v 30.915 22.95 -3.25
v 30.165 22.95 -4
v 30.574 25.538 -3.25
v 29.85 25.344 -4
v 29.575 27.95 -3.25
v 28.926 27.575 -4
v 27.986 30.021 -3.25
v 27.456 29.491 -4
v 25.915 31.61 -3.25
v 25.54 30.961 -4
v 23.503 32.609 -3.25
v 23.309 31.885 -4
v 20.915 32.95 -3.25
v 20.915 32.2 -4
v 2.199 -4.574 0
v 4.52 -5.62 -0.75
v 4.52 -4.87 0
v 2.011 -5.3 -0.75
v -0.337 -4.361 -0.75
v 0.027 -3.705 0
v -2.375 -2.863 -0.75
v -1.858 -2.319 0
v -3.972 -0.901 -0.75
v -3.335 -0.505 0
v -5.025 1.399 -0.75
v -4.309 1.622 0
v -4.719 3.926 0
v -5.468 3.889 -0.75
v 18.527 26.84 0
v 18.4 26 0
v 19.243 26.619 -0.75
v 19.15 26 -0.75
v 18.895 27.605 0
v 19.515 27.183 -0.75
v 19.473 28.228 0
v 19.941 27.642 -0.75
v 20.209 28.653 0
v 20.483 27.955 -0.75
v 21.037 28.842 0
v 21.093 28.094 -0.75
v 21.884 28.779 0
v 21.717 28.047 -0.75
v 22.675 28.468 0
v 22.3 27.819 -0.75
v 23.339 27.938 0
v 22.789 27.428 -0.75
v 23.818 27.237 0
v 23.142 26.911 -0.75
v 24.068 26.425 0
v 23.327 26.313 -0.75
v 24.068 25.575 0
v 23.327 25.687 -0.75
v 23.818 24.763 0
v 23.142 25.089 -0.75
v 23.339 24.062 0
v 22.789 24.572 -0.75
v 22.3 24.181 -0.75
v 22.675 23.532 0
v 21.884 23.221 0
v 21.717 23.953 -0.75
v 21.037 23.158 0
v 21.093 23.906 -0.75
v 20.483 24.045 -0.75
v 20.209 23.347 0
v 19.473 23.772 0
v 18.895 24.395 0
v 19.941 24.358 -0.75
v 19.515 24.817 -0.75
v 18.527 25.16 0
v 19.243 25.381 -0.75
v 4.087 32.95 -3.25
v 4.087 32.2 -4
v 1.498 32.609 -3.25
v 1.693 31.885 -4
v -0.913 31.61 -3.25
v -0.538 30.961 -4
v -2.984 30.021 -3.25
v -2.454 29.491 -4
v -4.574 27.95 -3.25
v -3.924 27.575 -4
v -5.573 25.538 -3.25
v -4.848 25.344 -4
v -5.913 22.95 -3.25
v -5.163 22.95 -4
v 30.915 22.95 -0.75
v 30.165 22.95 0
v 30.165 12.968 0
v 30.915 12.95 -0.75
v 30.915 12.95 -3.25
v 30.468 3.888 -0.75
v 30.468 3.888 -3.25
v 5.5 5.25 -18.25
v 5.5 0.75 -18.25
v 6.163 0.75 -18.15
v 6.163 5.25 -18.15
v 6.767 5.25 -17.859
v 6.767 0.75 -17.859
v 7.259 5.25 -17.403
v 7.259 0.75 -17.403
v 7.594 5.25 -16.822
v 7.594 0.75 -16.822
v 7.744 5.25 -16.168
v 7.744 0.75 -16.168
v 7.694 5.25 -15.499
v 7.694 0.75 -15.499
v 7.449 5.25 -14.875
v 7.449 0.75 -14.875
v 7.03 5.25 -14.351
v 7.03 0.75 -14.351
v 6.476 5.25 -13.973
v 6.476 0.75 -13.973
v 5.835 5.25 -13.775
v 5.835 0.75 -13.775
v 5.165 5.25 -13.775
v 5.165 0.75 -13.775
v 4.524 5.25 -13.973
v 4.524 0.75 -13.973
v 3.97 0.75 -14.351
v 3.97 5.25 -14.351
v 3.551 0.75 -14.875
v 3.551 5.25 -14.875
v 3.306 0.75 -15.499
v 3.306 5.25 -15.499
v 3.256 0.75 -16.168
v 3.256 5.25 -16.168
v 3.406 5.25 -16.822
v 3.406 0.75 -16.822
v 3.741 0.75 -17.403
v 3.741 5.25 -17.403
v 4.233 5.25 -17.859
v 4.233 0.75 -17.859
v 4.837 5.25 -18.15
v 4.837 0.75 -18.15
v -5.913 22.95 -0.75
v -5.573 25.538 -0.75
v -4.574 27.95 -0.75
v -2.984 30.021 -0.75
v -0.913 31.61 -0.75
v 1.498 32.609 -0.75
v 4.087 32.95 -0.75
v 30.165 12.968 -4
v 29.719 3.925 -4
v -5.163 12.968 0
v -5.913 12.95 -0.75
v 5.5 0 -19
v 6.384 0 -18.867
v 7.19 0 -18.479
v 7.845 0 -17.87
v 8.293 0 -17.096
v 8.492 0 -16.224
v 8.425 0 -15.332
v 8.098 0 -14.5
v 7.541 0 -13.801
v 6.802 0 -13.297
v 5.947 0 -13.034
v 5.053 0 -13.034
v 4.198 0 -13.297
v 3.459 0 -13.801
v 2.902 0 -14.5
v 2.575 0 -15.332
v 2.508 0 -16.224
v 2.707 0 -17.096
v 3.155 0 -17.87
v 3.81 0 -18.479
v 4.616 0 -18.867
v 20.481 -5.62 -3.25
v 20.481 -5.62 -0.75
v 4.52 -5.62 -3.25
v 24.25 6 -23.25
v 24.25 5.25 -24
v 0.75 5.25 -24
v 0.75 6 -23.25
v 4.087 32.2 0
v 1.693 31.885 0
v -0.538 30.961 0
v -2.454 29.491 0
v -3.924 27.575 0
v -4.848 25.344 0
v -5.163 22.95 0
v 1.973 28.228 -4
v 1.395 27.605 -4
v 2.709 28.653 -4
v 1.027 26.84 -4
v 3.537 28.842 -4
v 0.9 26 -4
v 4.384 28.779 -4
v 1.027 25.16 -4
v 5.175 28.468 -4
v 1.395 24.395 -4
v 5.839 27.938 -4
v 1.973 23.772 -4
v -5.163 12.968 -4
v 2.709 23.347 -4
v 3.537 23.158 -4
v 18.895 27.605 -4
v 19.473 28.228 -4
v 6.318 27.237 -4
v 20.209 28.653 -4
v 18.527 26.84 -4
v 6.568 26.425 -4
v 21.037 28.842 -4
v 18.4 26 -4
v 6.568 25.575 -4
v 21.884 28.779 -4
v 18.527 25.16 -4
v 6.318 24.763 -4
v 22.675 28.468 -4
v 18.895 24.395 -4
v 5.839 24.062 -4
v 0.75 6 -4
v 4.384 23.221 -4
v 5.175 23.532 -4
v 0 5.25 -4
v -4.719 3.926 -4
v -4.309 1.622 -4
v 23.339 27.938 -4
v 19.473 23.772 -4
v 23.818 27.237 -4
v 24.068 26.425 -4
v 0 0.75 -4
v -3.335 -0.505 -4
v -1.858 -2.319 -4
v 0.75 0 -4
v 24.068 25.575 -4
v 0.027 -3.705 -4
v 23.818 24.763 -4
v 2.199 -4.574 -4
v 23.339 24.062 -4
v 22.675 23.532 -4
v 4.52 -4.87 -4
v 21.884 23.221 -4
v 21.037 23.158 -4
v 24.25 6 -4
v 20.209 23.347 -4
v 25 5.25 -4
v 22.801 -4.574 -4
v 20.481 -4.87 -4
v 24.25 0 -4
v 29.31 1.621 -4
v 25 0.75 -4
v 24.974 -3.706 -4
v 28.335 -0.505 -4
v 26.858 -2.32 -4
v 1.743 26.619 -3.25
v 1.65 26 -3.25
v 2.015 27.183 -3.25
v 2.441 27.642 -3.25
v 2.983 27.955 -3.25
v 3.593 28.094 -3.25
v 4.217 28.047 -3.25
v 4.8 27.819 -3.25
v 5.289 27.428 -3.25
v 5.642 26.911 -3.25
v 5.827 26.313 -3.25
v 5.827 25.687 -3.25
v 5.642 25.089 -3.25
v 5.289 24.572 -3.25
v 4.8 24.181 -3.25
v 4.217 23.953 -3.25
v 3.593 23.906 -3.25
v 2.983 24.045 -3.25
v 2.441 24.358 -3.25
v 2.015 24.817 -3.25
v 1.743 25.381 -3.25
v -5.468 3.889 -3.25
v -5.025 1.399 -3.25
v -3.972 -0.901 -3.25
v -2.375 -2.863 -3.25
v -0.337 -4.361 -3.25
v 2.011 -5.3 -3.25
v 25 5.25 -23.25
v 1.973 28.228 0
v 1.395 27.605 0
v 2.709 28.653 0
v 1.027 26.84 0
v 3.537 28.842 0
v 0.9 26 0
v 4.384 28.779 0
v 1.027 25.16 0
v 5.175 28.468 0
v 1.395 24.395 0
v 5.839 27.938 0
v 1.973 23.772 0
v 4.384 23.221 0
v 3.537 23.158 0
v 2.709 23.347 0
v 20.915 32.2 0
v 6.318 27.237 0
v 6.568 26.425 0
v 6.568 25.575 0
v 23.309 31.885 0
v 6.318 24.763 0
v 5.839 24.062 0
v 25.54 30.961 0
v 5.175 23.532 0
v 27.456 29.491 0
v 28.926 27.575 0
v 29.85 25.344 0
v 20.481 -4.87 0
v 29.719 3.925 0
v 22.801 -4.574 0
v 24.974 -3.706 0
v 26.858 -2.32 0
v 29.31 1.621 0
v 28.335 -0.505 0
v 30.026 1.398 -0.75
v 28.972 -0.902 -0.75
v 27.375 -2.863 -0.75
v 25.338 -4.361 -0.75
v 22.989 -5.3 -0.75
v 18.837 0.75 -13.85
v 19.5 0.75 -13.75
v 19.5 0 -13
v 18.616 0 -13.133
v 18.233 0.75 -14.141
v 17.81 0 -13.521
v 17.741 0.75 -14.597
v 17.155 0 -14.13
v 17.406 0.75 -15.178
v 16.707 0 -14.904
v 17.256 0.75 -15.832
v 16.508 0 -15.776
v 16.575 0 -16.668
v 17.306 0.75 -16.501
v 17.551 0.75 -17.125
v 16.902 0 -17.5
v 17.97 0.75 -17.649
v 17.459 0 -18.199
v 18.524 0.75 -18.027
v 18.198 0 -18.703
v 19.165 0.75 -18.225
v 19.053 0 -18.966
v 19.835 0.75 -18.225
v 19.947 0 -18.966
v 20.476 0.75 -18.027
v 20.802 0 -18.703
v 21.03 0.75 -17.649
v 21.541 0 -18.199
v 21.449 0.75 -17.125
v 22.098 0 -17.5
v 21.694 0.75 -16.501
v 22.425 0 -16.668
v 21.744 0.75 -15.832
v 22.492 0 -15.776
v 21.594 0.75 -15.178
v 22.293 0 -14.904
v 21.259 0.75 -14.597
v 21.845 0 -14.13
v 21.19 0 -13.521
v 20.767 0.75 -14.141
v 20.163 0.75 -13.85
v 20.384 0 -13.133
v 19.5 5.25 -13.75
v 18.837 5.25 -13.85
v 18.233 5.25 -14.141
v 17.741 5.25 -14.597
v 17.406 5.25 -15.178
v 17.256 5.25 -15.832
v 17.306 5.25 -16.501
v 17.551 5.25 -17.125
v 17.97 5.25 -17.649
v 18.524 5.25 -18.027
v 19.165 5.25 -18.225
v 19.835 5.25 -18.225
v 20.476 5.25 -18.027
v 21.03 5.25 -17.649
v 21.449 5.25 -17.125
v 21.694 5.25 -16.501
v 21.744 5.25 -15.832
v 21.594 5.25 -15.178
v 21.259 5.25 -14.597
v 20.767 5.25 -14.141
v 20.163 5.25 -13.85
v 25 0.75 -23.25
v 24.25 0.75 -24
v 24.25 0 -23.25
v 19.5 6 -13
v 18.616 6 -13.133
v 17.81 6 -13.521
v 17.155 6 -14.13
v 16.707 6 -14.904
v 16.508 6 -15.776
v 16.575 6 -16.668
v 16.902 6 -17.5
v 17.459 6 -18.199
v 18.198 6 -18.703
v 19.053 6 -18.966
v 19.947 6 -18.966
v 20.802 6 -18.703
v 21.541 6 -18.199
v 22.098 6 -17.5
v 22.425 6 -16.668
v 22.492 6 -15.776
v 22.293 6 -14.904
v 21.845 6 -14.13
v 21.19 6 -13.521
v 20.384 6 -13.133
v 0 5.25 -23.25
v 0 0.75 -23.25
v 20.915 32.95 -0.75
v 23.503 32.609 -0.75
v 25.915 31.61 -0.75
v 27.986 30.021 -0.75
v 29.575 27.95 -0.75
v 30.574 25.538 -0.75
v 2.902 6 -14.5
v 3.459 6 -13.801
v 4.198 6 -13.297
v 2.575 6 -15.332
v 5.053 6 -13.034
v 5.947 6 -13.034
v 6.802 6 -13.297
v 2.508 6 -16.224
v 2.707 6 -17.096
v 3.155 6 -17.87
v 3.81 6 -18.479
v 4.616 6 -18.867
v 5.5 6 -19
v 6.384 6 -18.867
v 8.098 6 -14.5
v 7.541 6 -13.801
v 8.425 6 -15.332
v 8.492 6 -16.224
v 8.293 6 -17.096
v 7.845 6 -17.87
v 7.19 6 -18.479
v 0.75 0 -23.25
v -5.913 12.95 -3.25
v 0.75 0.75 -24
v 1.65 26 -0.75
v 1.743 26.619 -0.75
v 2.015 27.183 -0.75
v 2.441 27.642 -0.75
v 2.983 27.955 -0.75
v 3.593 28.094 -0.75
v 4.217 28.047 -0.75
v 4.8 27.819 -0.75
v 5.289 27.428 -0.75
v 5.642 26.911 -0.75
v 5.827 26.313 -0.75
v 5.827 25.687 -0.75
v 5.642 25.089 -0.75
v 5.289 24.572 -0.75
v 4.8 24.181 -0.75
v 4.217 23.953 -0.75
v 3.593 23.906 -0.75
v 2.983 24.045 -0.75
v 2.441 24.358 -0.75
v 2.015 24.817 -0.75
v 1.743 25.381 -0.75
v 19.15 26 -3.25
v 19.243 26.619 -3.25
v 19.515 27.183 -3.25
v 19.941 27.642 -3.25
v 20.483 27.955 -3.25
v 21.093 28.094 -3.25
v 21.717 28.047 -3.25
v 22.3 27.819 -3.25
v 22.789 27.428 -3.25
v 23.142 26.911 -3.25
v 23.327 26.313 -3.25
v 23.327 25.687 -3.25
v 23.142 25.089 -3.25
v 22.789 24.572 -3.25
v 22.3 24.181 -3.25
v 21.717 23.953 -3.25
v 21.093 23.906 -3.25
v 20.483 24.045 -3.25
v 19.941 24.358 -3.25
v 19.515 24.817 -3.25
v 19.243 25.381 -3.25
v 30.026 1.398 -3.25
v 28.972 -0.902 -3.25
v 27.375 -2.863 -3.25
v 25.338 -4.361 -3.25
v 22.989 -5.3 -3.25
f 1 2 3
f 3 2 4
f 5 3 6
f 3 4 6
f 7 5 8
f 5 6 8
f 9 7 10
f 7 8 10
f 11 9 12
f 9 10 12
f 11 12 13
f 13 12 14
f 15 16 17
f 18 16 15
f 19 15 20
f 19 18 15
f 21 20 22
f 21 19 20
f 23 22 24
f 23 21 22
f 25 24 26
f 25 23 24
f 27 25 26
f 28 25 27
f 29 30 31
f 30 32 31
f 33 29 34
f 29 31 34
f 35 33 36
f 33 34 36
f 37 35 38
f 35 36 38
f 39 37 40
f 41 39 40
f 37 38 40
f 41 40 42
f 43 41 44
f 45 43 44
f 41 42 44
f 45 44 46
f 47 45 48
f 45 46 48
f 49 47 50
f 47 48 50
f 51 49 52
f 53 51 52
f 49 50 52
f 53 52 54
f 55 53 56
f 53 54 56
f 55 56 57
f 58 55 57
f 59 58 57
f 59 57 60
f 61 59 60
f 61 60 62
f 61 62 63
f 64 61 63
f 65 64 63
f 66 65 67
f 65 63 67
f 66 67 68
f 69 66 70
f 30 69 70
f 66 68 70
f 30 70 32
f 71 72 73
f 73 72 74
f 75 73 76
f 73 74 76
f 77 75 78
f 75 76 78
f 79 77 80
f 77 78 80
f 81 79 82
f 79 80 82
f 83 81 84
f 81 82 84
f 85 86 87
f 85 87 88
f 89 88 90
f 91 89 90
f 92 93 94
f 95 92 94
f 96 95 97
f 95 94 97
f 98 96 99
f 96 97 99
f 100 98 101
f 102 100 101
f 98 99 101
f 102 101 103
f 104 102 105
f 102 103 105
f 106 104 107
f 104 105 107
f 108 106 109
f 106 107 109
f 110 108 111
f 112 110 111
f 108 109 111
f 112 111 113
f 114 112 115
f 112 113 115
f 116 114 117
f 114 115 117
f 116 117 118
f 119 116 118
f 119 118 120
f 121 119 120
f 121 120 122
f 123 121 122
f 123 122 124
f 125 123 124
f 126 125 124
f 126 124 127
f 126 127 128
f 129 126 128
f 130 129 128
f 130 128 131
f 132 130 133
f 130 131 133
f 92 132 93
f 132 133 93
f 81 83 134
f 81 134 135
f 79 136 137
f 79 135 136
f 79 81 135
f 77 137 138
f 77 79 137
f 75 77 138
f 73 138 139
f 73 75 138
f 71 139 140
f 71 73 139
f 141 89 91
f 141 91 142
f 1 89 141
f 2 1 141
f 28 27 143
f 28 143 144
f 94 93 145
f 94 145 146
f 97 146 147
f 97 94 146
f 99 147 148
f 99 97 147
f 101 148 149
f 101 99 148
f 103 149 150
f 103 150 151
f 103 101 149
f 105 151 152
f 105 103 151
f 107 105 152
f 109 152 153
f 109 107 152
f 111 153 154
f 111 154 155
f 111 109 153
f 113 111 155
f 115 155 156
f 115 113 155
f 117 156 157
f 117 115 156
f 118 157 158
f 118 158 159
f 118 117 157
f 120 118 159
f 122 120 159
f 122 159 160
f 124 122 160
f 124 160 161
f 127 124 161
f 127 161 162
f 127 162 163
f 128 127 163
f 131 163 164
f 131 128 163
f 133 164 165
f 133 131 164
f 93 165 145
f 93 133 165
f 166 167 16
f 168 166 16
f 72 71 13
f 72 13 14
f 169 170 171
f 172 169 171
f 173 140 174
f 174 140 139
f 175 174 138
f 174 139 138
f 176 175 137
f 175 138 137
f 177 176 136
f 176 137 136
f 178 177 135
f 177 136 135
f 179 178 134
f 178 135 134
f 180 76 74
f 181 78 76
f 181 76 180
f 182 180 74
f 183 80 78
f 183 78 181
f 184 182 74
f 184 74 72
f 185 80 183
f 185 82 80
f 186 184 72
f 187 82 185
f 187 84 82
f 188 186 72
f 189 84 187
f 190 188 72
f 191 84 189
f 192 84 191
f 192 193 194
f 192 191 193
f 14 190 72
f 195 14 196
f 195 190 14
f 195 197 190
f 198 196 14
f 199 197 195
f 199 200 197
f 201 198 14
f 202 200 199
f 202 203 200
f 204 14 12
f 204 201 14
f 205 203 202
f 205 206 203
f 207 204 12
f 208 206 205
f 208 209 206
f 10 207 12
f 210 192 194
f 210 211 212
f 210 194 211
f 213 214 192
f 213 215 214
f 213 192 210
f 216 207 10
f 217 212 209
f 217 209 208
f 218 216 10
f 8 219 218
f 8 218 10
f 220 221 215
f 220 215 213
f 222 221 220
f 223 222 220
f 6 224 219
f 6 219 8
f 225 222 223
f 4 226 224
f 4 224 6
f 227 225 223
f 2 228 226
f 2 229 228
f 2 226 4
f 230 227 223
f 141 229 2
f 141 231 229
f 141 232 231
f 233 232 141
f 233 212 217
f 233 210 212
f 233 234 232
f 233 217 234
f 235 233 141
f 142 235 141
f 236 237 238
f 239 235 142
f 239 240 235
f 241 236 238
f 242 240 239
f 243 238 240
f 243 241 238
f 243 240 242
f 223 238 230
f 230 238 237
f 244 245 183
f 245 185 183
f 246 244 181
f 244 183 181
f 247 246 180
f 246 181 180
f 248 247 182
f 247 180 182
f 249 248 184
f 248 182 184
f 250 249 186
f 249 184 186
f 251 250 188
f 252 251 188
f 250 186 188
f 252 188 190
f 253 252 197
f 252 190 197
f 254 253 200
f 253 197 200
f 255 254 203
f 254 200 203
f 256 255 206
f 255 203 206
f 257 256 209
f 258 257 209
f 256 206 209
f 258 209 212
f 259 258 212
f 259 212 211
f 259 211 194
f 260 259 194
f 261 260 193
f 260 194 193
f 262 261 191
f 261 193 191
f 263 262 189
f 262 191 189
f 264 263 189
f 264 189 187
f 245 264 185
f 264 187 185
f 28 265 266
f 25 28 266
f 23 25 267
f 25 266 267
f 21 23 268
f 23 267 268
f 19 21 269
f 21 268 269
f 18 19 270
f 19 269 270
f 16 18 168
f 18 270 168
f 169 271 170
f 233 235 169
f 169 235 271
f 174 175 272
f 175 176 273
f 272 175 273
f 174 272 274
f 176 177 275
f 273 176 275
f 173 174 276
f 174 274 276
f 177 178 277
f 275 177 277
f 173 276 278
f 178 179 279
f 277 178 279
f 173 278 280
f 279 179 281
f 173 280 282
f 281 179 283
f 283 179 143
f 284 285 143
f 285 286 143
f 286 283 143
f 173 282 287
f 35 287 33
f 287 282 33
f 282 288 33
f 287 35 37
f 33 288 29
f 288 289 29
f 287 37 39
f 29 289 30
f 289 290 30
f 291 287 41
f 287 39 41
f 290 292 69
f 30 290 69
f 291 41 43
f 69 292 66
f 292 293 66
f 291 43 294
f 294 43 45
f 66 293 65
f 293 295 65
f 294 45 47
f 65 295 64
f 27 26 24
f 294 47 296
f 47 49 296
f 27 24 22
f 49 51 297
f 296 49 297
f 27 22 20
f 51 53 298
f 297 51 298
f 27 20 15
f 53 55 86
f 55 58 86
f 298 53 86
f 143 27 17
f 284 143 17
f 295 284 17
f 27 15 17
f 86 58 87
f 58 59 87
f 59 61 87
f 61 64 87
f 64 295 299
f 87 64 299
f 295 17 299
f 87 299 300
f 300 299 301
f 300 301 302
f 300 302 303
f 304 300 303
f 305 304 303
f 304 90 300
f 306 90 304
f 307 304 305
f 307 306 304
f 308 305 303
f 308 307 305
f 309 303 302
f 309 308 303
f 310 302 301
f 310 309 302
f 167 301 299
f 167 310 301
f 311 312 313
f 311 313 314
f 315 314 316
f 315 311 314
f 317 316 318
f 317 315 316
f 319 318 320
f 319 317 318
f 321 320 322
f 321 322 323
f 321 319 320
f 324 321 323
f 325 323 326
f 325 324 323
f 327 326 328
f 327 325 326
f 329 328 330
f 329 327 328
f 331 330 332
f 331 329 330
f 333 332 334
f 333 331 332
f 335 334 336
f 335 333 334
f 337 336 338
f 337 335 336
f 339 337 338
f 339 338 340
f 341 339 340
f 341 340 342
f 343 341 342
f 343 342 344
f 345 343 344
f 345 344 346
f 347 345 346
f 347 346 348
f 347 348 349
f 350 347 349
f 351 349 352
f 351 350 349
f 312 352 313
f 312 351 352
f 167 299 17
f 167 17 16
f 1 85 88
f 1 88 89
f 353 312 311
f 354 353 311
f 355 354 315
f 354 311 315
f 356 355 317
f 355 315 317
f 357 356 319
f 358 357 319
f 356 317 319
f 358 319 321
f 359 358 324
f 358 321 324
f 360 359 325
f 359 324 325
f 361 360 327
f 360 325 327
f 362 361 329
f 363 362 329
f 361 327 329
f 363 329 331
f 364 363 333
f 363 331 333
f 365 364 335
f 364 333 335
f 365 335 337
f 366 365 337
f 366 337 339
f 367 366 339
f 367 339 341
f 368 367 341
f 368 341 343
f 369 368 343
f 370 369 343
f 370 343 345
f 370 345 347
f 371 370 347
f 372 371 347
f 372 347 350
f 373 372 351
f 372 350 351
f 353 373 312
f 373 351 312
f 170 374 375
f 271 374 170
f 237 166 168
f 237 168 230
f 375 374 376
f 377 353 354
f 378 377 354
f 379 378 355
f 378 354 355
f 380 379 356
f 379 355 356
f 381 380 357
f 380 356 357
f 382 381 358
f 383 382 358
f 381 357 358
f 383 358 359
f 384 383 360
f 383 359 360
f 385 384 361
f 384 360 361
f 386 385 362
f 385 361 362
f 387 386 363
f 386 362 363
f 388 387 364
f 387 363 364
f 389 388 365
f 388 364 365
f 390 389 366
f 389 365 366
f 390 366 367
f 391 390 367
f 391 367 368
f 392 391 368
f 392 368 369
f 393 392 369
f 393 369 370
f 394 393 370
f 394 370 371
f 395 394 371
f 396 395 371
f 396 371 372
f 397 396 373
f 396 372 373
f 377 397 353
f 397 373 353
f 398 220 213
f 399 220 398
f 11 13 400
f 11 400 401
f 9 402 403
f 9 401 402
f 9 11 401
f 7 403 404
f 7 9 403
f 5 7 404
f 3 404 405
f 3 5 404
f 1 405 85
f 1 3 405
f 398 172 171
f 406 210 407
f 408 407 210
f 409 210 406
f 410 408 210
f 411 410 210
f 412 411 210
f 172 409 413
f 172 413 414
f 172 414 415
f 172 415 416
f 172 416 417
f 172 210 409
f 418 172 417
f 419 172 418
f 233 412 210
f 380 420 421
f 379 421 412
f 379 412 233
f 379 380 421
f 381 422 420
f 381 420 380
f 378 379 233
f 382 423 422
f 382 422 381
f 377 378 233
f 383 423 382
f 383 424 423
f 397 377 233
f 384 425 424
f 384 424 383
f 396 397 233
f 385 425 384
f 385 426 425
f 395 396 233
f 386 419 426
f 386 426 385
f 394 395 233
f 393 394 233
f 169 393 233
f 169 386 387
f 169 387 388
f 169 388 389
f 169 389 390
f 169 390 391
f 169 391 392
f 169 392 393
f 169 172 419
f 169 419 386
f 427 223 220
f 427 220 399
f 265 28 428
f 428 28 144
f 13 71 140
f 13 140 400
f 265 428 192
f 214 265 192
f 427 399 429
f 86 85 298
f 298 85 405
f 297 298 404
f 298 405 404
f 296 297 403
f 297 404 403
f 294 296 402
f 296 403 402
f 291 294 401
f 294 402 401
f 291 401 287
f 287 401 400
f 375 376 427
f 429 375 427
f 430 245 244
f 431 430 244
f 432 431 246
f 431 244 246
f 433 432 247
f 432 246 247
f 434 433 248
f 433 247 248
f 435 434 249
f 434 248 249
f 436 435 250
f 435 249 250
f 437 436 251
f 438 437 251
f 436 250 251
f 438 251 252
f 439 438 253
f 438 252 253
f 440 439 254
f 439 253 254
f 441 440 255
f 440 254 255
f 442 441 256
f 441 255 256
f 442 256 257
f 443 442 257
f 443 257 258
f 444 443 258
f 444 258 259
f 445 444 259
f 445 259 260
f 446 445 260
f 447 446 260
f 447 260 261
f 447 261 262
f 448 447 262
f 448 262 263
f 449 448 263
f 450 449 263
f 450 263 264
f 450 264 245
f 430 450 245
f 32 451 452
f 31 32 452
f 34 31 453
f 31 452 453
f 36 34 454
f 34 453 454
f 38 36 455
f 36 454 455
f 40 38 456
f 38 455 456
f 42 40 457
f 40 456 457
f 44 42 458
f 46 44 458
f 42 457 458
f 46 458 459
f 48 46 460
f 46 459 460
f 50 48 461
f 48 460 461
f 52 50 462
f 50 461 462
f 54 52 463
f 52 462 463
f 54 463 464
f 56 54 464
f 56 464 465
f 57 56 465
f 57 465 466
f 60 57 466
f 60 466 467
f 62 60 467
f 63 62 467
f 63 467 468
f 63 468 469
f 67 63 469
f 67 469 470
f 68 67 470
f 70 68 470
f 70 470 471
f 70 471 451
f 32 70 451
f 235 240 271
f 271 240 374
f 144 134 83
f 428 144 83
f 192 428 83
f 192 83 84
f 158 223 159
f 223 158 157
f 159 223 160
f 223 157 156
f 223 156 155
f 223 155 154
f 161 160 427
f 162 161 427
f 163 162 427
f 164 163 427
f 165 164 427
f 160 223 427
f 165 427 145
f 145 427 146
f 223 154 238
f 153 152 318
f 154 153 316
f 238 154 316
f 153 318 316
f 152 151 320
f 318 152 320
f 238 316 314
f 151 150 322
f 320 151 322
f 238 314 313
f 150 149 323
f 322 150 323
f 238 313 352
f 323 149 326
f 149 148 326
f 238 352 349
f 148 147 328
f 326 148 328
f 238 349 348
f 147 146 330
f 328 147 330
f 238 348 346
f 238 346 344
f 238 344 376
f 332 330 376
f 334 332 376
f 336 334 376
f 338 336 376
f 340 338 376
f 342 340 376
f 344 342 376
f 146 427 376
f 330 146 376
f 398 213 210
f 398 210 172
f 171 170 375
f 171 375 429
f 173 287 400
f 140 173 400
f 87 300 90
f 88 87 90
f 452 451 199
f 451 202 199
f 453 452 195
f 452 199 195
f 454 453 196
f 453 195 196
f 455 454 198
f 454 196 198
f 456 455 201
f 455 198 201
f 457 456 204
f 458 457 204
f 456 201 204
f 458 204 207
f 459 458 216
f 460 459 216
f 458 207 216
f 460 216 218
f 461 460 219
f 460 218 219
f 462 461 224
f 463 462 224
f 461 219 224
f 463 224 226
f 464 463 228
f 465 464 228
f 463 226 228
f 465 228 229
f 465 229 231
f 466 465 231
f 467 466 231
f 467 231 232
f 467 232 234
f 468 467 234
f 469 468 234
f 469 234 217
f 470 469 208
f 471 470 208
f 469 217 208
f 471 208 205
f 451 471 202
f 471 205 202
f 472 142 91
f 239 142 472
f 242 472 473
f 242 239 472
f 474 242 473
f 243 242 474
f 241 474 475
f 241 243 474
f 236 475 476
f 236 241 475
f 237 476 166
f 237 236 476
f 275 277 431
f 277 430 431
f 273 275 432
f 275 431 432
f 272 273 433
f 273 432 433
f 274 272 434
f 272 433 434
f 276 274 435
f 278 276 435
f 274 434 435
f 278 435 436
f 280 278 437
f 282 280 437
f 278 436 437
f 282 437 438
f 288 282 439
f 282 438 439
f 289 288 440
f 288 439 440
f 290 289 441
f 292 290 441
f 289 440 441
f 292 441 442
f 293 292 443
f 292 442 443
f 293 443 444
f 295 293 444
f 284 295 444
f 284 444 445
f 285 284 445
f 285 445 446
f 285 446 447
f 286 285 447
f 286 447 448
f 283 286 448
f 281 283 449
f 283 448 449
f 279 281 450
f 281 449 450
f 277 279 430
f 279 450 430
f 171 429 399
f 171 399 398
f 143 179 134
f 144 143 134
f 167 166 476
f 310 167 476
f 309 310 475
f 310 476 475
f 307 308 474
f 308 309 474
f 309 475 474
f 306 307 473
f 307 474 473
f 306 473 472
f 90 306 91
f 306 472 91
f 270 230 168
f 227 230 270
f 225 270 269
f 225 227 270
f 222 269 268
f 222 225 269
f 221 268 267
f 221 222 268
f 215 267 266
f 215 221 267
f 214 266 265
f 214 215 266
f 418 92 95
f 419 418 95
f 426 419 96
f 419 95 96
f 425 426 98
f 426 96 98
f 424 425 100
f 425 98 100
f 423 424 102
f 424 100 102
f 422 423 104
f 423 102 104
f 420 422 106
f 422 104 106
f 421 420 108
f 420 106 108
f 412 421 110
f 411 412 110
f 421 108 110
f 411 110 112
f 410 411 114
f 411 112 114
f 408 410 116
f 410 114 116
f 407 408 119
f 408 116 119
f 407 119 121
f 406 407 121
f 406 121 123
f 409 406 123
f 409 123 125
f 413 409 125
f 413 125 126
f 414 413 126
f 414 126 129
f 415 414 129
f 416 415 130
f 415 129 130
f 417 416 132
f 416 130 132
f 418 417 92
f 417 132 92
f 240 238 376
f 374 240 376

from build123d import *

# Parameters (mm, degrees)
SKETCH1_W           = 25
SKETCH1_H           = 25
BOSS_EXTRUDE1_DEPTH = 6
BOSS_EXTRUDE3_DEPTH = 4
SKETCH2_R           = 2.25
CUT_EXTRUDE1_DEPTH  = 6
SKETCH9_W           = 25
SKETCH9_H           = 6
CUT_EXTRUDE2_DEPTH  = 1
SKETCH11_W          = 36.82832664
SKETCH11_H          = 4
BOSS_EXTRUDE4_DEPTH = 20
SKETCH13_R          = 2.1
CUT_EXTRUDE3_DEPTH  = 50.410927182
FILLET2_R           = 10
CHAMFER1_SIZE       = 0.75
CHAMFER2_SIZE       = 0.75
CHAMFER3_SIZE       = 0.75


with BuildPart() as part:
    # Sketch1 → Boss-Extrude1 (new body)
    with BuildSketch(Plane(origin=(0, 0, 0), x_dir=(1, 0, 0), z_dir=(0, 1, 0))):
        with Locations((12.5, 12.5)):
            Rectangle(SKETCH1_W, SKETCH1_H)
    extrude(amount=BOSS_EXTRUDE1_DEPTH)

    # Sketch5 → Boss-Extrude3 (add)
    with BuildSketch(Plane.XY):
        Polygon((-5.91332664, 12.95), (30.915, 12.95), (30, -5.62), (-5, -5.62), align=None)
    extrude(amount=-BOSS_EXTRUDE3_DEPTH)

    # Sketch2 → Cut-Extrude1 (cut)
    with BuildSketch(Plane.XZ):
        with Locations(Location((5.5, -16, 0), (0, 0, 270))):
            Circle(SKETCH2_R)
        with Locations(Location((19.5, -16, 0), (0, 0, 90))):
            Circle(SKETCH2_R)
    extrude(amount=-CUT_EXTRUDE1_DEPTH, mode=Mode.SUBTRACT)

    # Sketch9 → Cut-Extrude2 (cut)
    with BuildSketch(Plane(origin=(0, 0, -25), x_dir=(-1, 0, 0), z_dir=(0, 0, -1))):
        with Locations((-12.5, 3)):
            Rectangle(SKETCH9_W, SKETCH9_H)
    extrude(amount=-CUT_EXTRUDE2_DEPTH, mode=Mode.SUBTRACT)

    # Sketch11 → Boss-Extrude4 (add)
    with BuildSketch(Plane(origin=(0, 12.95, 0), x_dir=(1, 0, 0), z_dir=(0, 1, 0))):
        with Locations((12.50083668, 2)):
            Rectangle(SKETCH11_W, SKETCH11_H)
    extrude(amount=BOSS_EXTRUDE4_DEPTH)

    # Sketch13 → Cut-Extrude3 (cut, through all)
    with BuildSketch(Plane(origin=(0, 0, -4), x_dir=(-1, 0, 0), z_dir=(0, 0, -1))):
        with Locations((-21.25, 26)):
            Circle(SKETCH13_R)
        with Locations((-3.75, 26)):
            Circle(SKETCH13_R)
    extrude(amount=-CUT_EXTRUDE3_DEPTH, mode=Mode.SUBTRACT)

    # Fillet2
    fillet2_edges = [part.edges().sort_by_distance(p)[0] for p in [
        (30, -5.62, -2),
        (-5, -5.62, -2),
        (-5.91332664, 32.95, -2),
        (30.915, 32.95, -2),
    ]]
    fillet(fillet2_edges, radius=FILLET2_R)

    # Chamfer1
    # the kernel refuses this chamfer: 0.75 mm, written as the material it takes off along each edge
    with BuildSketch(Plane(origin=(20.480598416, -5.62, 0), x_dir=(0, 0.9996219169112968, 0.02749587661058636), z_dir=(-1, 0, 0)), Plane(origin=(20.480598416, -5.62, -4), x_dir=(0, -0.02749587661058678, 0.9996219169112968), z_dir=(-1, 0, 0))) as chamfer1_piece_1:
        Polygon((CHAMFER1_SIZE * 0.999621916911, CHAMFER1_SIZE * 0.0274958766106), (-CHAMFER1_SIZE * 0.0274958766106, CHAMFER1_SIZE * 0.999621916911), (0, 0), align=None)
    extrude(amount=15.960340029, mode=Mode.SUBTRACT)
    with BuildSketch(Plane(origin=(31.009920786, 14.876425142, 0), x_dir=(-0.9984106656617833, 0.04919470969738991, 0.027495876610586206), z_dir=(-0.04921331642006734, -0.9987882906236629, 0)), Plane(origin=(31.009920786, 14.876425142, -4), x_dir=(0.027462559599087527, -0.0013531632758839558, 0.9996219169112968), z_dir=(-0.04921331642006734, -0.9987882906236629, 0))) as chamfer1_piece_2:
        Polygon((CHAMFER1_SIZE * 0.999621916911, CHAMFER1_SIZE * 0.0274958766106), (-CHAMFER1_SIZE * 0.0274958766106, CHAMFER1_SIZE * 0.999621916911), (0, 0), align=None)
    extrude(amount=11.001889398, mode=Mode.SUBTRACT)
    with BuildSketch(Plane(origin=(30.915, 11.021237759, 0), x_dir=(-0.9996219169112968, 0, 0.02749587661058636), z_dir=(0, 1, 0)), Plane(origin=(30.915, 11.021237759, -4), x_dir=(0.02749587661058678, 0, 0.9996219169112968), z_dir=(0, 1, 0))) as chamfer1_piece_3:
        Polygon((CHAMFER1_SIZE * 0.999621916911, -CHAMFER1_SIZE * 0.0274958766106), (-CHAMFER1_SIZE * 0.0274958766106, -CHAMFER1_SIZE * 0.999621916911), (0, 0), align=None)
    extrude(amount=11.928762241, mode=Mode.SUBTRACT)
    with BuildSketch(Plane(origin=(4.08667336, 32.95, 0), x_dir=(0, -0.9996219169112968, 0.027495876610586487), z_dir=(1, 0, 0))) as chamfer1_piece_4:
        Polygon((CHAMFER1_SIZE * 0.999621916911, CHAMFER1_SIZE * 0.0274958766106), (-CHAMFER1_SIZE * 0.0274958766106, CHAMFER1_SIZE * 0.999621916911), (0, 0), align=None)
    extrude(amount=16.82832664, mode=Mode.SUBTRACT)
    with BuildSketch(Plane(origin=(-5.91332664, 11.021237759, 0), x_dir=(0.9996219169112968, 0, 0.02749587661058636), z_dir=(0, 1, 0)), Plane(origin=(-5.91332664, 11.021237759, -4), x_dir=(-0.02749587661058678, 0, 0.9996219169112968), z_dir=(0, 1, 0))) as chamfer1_piece_5:
        Polygon((CHAMFER1_SIZE * 0.999621916911, CHAMFER1_SIZE * 0.0274958766106), (-CHAMFER1_SIZE * 0.0274958766106, CHAMFER1_SIZE * 0.999621916911), (0, 0), align=None)
    extrude(amount=11.928762241, mode=Mode.SUBTRACT)
    with BuildSketch(Plane(origin=(20.915, 22.95, 0), x_dir=(1, 0, 0), z_dir=(0, -1, 0))) as chamfer1_piece_6:
        Polygon((10 - CHAMFER1_SIZE, 0), (10, -CHAMFER1_SIZE), (10, 0), align=None)
    revolve(axis=Axis((20.915, 22.95, 0), (0, 0, 1)), revolution_arc=90, mode=Mode.SUBTRACT)
    with BuildSketch(Plane(origin=(4.08667336, 22.95, 0), x_dir=(0, 1, 0), z_dir=(1, 0, 0))) as chamfer1_piece_7:
        Polygon((10 - CHAMFER1_SIZE, 0), (10, -CHAMFER1_SIZE), (10, 0), align=None)
    revolve(axis=Axis((4.08667336, 22.95, 0), (0, 0, 1)), revolution_arc=90, mode=Mode.SUBTRACT)
    with BuildSketch(Plane(origin=(4.520258387, 4.38, 0), x_dir=(0, -1, 0), z_dir=(1, 0, 0))) as chamfer1_piece_8:
        Polygon((10 - CHAMFER1_SIZE, 0), (10, CHAMFER1_SIZE), (10, 0), align=None)
    revolve(axis=Axis((4.520258387, 4.38, 0), (0, 0, -1)), revolution_arc=87.184295724, mode=Mode.SUBTRACT)
    with BuildSketch(Plane(origin=(20.480598416, 4.38, 0), x_dir=(0.9987882906236628, -0.04921331642006739, 0), z_dir=(0.04921331642006739, 0.9987882906236628, 0))) as chamfer1_piece_9:
        Polygon((10 - CHAMFER1_SIZE, 0), (10, CHAMFER1_SIZE), (10, 0), align=None)
    revolve(axis=Axis((20.480598416, 4.38, 0), (0, 0, -1)), revolution_arc=87.179145229, mode=Mode.SUBTRACT)
    with BuildSketch(Plane(origin=(20.915, 32.95, -4), x_dir=(0, 0.02749587661058218, 0.9996219169112969), z_dir=(-1, 0, 0))) as chamfer1_piece_10:
        Polygon((CHAMFER1_SIZE * 0.999621916911, -CHAMFER1_SIZE * 0.0274958766106), (-CHAMFER1_SIZE * 0.0274958766106, -CHAMFER1_SIZE * 0.999621916911), (0, 0), align=None)
    extrude(amount=16.82832664, mode=Mode.SUBTRACT)
    with BuildSketch(Plane(origin=(20.915, 22.95, -4), x_dir=(1, 0, 0), z_dir=(0, -1, 0))) as chamfer1_piece_11:
        Polygon((10, CHAMFER1_SIZE), (10 - CHAMFER1_SIZE, 0), (10, 0), align=None)
    revolve(axis=Axis((20.915, 22.95, -4), (0, 0, 1)), revolution_arc=90, mode=Mode.SUBTRACT)
    with BuildSketch(Plane(origin=(4.08667336, 22.95, -4), x_dir=(0, 1, 0), z_dir=(1, 0, 0))) as chamfer1_piece_12:
        Polygon((10, CHAMFER1_SIZE), (10 - CHAMFER1_SIZE, 0), (10, 0), align=None)
    revolve(axis=Axis((4.08667336, 22.95, -4), (0, 0, 1)), revolution_arc=90, mode=Mode.SUBTRACT)
    with BuildSketch(Plane(origin=(4.520258387, 4.38, -4), x_dir=(0, -1, 0), z_dir=(1, 0, 0))) as chamfer1_piece_13:
        Polygon((10, -CHAMFER1_SIZE), (10 - CHAMFER1_SIZE, 0), (10, 0), align=None)
    revolve(axis=Axis((4.520258387, 4.38, -4), (0, 0, -1)), revolution_arc=87.184295724, mode=Mode.SUBTRACT)
    with BuildSketch(Plane(origin=(20.480598416, 4.38, -4), x_dir=(0.9987882906236628, -0.04921331642006739, 0), z_dir=(0.04921331642006739, 0.9987882906236628, 0))) as chamfer1_piece_14:
        Polygon((10, -CHAMFER1_SIZE), (10 - CHAMFER1_SIZE, 0), (10, 0), align=None)
    revolve(axis=Axis((20.480598416, 4.38, -4), (0, 0, -1)), revolution_arc=87.179145229, mode=Mode.SUBTRACT)
    with BuildSketch(Plane(origin=(-5.467668718, 3.888764679, 0), x_dir=(0.998415083892051, 0.049104959283599446, 0.027495876610586386), z_dir=(-0.04912353206032882, 0.9987927105250207, 0)), Plane(origin=(-5.467668718, 3.888764679, -4), x_dir=(-0.02746268112814937, -0.0013506945762069992, 0.9996219169112968), z_dir=(-0.04912353206032882, 0.9987927105250207, 0))) as chamfer1_piece_15:
        Polygon((CHAMFER1_SIZE * 0.999621916911, CHAMFER1_SIZE * 0.0274958766106), (-CHAMFER1_SIZE * 0.0274958766106, CHAMFER1_SIZE * 0.999621916911), (0, 0), align=None)
    extrude(amount=11.000950319, mode=Mode.SUBTRACT)
    with BuildSketch(Plane(origin=(21.25, 26, 0), x_dir=(-1, 0, 0), z_dir=(0, -1, 0))) as chamfer1_piece_16:
        Polygon((2.1 + CHAMFER1_SIZE, 0), (2.1, CHAMFER1_SIZE), (2.1, 0), align=None)
    revolve(axis=Axis((21.25, 26, 0), (0, 0, -1)), mode=Mode.SUBTRACT)
    with BuildSketch(Plane(origin=(21.25, 26, -4), x_dir=(-1, 0, 0), z_dir=(0, -1, 0))) as chamfer1_piece_17:
        Polygon((2.1, -CHAMFER1_SIZE), (2.1 + CHAMFER1_SIZE, 0), (2.1, 0), align=None)
    revolve(axis=Axis((21.25, 26, -4), (0, 0, -1)), mode=Mode.SUBTRACT)
    with BuildSketch(Plane(origin=(3.75, 26, 0), x_dir=(-1, 0, 0), z_dir=(0, -1, 0))) as chamfer1_piece_18:
        Polygon((2.1 + CHAMFER1_SIZE, 0), (2.1, CHAMFER1_SIZE), (2.1, 0), align=None)
    revolve(axis=Axis((3.75, 26, 0), (0, 0, -1)), mode=Mode.SUBTRACT)
    with BuildSketch(Plane(origin=(3.75, 26, -4), x_dir=(-1, 0, 0), z_dir=(0, -1, 0))) as chamfer1_piece_19:
        Polygon((2.1, -CHAMFER1_SIZE), (2.1 + CHAMFER1_SIZE, 0), (2.1, 0), align=None)
    revolve(axis=Axis((3.75, 26, -4), (0, 0, -1)), mode=Mode.SUBTRACT)

    # Chamfer2
    chamfer2_edges = [part.edges().sort_by_distance(p)[0] for p in [
        (5.5, 6, -13.75),
        (5.5, 0, -13.75),
        (19.5, 6, -18.25),
        (19.5, 0, -18.25),
    ]]
    chamfer(chamfer2_edges, length=CHAMFER2_SIZE)

    # Chamfer3
    chamfer3_edges = [part.edges().sort_by_distance(p)[0] for p in [
        (25, 0, -14),
        (25, 6, -14),
        (0, 0, -14),
        (0, 6, -14),
        (25, 3, -24),
        (12.5, 6, -24),
        (0, 3, -24),
        (12.5, 0, -24),
    ]]
    chamfer(chamfer3_edges, length=CHAMFER3_SIZE)


solid = part.part
